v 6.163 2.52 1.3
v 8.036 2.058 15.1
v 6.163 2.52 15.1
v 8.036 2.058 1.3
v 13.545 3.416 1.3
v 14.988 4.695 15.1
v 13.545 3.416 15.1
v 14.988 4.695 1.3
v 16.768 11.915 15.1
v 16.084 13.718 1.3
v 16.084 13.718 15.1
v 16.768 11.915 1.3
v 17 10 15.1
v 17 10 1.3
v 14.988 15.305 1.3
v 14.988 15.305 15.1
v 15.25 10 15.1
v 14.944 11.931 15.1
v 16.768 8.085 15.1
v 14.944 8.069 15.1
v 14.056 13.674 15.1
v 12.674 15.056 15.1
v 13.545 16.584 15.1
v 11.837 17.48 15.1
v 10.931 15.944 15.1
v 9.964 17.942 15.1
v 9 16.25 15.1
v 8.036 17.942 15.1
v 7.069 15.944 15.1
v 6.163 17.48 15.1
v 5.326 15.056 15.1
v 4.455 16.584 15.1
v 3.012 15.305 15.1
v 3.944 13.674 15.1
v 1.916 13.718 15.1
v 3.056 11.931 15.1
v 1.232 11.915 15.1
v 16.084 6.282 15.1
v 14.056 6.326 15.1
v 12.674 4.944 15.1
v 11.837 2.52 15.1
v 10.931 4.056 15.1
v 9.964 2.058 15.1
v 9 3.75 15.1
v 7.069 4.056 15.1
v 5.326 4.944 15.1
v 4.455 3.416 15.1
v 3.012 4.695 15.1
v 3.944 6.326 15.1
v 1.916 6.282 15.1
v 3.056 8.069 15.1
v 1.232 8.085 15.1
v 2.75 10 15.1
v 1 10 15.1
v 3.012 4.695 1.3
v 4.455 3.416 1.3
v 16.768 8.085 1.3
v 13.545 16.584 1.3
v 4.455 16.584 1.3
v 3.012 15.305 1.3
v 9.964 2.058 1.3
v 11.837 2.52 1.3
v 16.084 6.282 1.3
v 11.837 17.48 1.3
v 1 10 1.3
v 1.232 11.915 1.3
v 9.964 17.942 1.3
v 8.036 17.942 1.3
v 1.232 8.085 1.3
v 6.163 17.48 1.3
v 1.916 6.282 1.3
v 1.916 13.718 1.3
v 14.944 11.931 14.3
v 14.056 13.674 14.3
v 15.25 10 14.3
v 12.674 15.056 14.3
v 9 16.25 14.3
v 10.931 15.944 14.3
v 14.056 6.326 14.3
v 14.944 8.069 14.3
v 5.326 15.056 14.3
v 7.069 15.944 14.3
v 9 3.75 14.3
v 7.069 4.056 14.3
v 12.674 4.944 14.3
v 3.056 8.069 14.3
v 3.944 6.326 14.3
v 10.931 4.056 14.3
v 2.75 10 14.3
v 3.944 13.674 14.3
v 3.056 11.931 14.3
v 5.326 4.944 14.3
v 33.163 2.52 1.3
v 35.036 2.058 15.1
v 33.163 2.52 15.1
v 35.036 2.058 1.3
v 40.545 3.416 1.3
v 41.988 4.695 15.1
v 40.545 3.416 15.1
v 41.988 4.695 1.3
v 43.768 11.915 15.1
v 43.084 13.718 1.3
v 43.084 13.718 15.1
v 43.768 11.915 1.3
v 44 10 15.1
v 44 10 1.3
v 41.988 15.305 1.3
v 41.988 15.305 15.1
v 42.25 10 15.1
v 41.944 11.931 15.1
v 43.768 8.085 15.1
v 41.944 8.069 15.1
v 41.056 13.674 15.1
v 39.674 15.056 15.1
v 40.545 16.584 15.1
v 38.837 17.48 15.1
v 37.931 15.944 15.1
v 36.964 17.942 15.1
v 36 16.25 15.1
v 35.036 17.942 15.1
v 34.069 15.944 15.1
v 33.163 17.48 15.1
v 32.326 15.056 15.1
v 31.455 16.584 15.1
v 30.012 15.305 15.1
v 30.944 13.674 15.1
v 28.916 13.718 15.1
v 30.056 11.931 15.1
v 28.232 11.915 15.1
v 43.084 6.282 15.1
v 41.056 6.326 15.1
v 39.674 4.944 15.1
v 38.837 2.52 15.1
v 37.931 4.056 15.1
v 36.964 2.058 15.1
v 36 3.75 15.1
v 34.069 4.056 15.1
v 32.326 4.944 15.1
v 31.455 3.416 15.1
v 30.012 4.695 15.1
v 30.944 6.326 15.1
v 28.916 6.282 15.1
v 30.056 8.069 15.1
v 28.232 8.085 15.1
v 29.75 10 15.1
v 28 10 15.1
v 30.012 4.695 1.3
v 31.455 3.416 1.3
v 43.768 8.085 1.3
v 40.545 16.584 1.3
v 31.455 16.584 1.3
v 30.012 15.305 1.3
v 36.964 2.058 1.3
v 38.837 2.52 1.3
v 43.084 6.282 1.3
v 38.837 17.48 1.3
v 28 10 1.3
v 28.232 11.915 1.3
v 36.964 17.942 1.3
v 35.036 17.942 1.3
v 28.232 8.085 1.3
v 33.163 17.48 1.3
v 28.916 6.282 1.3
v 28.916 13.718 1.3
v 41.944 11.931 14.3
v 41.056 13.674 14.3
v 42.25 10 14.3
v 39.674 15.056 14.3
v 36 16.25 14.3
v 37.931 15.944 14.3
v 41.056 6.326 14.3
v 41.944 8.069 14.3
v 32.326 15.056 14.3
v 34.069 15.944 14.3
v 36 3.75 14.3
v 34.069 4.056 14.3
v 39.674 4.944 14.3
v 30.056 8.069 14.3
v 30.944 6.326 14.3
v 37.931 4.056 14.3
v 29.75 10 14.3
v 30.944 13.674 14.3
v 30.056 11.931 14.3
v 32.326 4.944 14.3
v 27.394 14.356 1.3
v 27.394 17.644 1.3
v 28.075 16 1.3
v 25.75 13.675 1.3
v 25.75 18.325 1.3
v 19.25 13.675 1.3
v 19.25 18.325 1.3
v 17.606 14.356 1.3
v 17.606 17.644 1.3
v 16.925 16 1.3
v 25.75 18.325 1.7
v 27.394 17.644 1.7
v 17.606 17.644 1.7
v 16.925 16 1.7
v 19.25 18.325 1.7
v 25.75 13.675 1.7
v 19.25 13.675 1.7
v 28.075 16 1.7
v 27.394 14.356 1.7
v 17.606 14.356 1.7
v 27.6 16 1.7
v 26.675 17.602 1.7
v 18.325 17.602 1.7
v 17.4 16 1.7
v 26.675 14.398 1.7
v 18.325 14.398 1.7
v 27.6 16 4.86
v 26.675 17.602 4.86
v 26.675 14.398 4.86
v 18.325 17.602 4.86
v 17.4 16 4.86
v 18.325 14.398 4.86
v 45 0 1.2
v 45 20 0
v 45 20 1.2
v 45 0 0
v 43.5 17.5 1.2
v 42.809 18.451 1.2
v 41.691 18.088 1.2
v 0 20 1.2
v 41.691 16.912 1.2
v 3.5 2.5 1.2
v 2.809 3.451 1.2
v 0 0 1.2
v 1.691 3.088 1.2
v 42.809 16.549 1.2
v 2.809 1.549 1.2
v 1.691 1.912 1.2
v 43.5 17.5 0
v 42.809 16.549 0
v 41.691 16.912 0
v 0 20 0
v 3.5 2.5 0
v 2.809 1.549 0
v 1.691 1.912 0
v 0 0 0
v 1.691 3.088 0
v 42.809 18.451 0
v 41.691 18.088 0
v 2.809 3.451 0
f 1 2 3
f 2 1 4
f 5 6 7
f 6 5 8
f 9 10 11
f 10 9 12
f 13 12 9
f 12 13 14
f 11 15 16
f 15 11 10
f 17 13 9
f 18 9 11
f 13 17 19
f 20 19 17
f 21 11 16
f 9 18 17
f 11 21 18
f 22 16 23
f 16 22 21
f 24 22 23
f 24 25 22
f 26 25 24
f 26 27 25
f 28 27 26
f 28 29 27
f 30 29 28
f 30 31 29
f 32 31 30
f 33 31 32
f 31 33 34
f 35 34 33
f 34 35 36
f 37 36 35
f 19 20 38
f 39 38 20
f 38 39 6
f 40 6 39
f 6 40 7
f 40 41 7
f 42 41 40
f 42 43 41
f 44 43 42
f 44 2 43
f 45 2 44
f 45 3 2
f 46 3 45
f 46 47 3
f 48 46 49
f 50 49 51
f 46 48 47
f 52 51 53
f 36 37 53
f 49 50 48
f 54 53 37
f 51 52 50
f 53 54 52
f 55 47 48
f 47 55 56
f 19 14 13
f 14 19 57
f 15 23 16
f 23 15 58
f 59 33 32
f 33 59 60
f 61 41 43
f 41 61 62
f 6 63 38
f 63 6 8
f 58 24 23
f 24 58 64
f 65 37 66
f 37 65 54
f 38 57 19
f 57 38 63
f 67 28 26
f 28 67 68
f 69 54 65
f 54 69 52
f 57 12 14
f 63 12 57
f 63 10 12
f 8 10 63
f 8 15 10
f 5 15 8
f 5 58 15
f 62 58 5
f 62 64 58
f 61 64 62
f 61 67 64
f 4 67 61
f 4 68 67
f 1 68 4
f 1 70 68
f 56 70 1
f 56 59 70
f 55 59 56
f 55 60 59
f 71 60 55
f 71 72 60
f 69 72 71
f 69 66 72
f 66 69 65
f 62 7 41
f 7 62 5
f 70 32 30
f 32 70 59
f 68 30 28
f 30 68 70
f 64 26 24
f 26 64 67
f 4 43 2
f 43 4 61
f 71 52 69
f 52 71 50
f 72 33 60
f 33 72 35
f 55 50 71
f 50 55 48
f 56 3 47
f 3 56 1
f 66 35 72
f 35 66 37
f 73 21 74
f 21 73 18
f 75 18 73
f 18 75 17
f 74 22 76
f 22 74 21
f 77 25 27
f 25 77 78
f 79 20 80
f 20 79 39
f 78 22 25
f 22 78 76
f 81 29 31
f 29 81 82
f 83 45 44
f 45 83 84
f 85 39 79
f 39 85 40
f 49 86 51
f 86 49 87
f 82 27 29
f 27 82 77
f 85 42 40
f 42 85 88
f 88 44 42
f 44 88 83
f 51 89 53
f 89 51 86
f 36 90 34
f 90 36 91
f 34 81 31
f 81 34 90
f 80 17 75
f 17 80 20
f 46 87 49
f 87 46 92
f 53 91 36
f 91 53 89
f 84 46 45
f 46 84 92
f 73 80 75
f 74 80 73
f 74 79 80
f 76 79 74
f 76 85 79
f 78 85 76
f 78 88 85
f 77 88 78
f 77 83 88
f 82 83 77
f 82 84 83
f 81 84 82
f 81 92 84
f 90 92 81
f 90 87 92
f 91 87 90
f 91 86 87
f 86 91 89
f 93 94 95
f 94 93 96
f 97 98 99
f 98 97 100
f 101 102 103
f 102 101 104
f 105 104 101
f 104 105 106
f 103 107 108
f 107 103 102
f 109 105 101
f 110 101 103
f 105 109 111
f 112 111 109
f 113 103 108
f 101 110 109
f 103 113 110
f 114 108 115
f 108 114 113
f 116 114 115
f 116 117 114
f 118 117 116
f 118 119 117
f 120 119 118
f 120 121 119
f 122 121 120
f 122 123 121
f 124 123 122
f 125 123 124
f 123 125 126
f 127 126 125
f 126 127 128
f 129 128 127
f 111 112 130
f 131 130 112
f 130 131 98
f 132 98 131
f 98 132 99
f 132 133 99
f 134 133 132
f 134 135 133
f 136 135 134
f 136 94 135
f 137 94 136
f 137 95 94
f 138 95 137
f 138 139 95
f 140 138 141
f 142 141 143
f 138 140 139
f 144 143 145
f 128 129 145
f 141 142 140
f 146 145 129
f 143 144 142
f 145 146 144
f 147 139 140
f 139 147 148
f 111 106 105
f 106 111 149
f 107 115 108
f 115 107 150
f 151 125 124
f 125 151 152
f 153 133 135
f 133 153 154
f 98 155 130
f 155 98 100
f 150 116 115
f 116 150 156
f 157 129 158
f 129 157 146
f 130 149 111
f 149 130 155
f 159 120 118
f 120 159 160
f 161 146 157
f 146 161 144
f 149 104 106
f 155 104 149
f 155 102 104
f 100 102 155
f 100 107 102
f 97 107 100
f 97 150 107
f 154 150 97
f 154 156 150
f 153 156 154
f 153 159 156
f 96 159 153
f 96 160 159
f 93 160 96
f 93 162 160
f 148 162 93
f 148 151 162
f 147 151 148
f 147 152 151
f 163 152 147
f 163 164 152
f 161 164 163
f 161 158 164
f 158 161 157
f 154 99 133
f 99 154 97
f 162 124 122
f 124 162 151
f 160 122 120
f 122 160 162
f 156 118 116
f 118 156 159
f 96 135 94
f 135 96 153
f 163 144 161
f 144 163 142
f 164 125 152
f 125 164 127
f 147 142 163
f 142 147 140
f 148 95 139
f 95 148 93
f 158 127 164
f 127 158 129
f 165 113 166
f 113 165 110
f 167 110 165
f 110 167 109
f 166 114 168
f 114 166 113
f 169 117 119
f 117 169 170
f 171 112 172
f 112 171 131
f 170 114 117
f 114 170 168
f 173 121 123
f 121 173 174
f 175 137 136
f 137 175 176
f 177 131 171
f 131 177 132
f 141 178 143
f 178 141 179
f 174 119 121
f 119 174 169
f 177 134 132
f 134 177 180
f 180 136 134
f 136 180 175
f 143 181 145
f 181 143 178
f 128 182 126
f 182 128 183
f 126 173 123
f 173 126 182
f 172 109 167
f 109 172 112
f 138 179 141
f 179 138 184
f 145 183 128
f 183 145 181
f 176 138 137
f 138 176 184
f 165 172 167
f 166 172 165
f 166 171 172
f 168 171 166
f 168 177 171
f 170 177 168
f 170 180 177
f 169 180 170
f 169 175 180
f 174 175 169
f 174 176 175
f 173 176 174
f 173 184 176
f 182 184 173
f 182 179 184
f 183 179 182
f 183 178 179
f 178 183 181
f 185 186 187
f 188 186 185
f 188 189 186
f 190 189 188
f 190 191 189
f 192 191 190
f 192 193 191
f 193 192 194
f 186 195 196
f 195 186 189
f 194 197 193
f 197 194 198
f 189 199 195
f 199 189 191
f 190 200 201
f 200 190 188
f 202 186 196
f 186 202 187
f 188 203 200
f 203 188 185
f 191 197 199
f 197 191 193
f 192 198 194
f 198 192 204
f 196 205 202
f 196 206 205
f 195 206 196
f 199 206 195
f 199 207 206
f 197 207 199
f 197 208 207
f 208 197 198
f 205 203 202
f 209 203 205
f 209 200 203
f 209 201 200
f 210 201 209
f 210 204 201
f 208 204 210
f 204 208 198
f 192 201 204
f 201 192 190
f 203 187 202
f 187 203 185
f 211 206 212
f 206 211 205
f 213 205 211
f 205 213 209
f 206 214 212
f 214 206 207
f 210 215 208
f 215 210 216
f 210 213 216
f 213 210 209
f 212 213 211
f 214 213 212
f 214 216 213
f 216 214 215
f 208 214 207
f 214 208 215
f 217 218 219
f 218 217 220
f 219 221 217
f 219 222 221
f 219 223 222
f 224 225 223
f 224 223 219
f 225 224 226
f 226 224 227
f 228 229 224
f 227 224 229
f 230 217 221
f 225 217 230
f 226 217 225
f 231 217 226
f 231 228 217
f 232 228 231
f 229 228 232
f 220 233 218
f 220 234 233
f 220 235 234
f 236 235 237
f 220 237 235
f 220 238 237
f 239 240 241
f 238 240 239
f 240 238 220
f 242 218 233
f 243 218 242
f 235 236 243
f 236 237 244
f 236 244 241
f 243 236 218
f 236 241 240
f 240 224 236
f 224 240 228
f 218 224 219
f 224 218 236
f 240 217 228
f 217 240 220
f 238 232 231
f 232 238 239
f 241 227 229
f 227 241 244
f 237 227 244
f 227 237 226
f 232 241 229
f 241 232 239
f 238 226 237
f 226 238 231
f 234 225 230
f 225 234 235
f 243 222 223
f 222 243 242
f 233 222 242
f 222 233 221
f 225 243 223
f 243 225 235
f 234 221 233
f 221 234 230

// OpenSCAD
//HC-SR04 Ultrasonic distance sensor module
//Mark Benson
//23/07/2013
//Creative Commons non commercial

module hcsr04() {
    difference()
    {
        union()
        {
            color("DARKBLUE") cube([45,20,1.2]);
            translate([16/2+1,18/2+1,1.3]) ultrasonicSensor();
            translate([16/2+27+1,18/2+1,1.3]) ultrasonicSensor();
            color("SILVER") translate([45/2-3.25,20-4,1.3]) xtal();

            // pins are removed 
            //translate([(45/2)-((2.45*4)/2)+0.6,2,-0.2]) rotate([180,0,0]) headerPin(4);
        }

        union()
        {
            color("DARKBLUE") translate([2.5,2.5,-1]) cylinder(d=2, h=3);
            color("DARKBLUE") translate([2.5+40,2.5+15,-1]) cylinder(d=2, h=3);
        }
    }
}

module ultrasonicSensor()
{
    union()
    {
        //Sensor body
        color("SILVER") difference()
        {
            //Body
            translate([0,0,0]) cylinder(d=16, h=13.8);
            //Hole in body
            translate([0,0,0]) cylinder(d=12.5, h=14);
        }

        //Insert to indicate mesh
        color("GREY") translate([0,0,0]) cylinder(d=12.5, h=13);
    }
}

module xtal()
{
    //Base
    hull()
    {
        translate([0,0,0]) cylinder(d=4.65, h=0.4);
        translate([6.5,0,0]) cylinder(d=4.65, h=0.4);
    }
    
    //Body
    hull()
    {
        translate([0,0,0]) cylinder(d=3.7, h=3.56);
        translate([6.5,0,0]) cylinder(d=3.7, h=3.56);
    }
}

module headerPin(numberOfPins)
{
    for (i = [0:numberOfPins-1])
    {
        color("GOLD") translate([(i*2.54),0,-2]) cube([0.5,0.5,8]);
        color("BLACK") translate([(i*2.54-2.54/2+0.25),-2.54/2+0.25,0]) cube([2.54,2.54,1]);
    }
}

hcsr04();
